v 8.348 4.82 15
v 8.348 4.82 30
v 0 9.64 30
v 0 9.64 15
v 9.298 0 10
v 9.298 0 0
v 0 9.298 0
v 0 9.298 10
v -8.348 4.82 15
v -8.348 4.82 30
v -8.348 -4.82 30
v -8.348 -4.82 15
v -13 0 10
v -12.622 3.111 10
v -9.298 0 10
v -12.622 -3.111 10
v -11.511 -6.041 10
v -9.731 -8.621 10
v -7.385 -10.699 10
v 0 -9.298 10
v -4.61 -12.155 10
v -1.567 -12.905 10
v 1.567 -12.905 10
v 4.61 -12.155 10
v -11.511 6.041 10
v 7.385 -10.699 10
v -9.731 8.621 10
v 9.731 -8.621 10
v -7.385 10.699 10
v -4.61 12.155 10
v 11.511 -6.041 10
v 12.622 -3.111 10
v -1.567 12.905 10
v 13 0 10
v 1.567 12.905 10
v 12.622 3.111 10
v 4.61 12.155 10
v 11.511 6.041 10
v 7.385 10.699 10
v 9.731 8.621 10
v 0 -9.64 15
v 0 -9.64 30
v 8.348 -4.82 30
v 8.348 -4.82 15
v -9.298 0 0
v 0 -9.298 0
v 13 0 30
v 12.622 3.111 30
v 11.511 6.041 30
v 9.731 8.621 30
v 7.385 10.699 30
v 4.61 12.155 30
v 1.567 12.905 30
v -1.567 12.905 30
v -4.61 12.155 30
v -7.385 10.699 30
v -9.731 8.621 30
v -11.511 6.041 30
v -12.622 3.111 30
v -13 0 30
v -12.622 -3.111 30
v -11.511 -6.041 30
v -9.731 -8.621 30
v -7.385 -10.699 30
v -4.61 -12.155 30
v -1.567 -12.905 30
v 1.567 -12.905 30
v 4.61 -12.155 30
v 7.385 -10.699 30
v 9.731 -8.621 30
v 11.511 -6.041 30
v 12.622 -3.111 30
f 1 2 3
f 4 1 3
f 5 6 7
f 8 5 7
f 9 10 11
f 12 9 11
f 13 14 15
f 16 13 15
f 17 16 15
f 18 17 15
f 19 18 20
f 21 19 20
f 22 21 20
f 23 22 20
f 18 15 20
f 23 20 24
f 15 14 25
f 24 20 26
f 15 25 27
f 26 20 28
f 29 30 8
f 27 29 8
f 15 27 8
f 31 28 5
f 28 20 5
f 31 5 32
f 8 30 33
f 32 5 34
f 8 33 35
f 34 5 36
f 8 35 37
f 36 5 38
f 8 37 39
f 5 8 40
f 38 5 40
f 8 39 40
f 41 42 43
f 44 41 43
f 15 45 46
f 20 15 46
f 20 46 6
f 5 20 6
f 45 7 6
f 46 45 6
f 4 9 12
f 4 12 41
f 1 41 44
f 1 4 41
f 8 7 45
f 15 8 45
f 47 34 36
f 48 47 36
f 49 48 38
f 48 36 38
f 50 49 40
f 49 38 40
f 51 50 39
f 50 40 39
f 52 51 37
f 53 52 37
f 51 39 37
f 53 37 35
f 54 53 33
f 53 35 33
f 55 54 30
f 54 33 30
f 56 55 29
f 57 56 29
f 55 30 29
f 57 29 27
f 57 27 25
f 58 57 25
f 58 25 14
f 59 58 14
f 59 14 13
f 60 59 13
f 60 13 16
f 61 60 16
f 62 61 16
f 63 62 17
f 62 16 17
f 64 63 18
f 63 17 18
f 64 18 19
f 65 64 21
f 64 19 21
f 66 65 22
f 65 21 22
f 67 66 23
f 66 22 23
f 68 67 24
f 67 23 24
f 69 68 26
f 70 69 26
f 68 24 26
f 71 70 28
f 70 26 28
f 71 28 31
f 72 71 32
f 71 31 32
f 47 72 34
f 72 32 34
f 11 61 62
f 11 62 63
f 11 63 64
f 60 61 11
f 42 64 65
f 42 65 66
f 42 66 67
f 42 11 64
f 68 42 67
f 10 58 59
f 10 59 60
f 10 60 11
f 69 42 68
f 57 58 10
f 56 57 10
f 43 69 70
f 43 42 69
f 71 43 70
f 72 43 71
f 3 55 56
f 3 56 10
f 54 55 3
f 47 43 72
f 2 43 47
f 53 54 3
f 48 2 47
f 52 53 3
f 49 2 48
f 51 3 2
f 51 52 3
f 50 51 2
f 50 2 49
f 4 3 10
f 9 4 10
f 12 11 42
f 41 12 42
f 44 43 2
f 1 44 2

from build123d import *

# Parameters (mm, degrees)
PAD_DEPTH    = 10
SKETCH001_R  = 13
PAD001_DEPTH = 20
POCKET_DEPTH = 15


with BuildPart() as part:
    # Sketch → Pad (new body)
    with BuildSketch(Plane.XY):
        Polygon((0, 9.298454), (-9.298454, 0), (0, -9.298454), (9.298454, 0), align=None)
    extrude(amount=PAD_DEPTH)

    # Sketch001 (on Face6 of Pad) → Pad001 (join)
    with BuildSketch(Plane.XY.offset(10)):
        Circle(SKETCH001_R)
    extrude(amount=PAD001_DEPTH)

    # Sketch002 (on Face3 of Pad001) → Pocket (cut)
    with BuildSketch(Plane.XY.offset(30)):
        Polygon((0, 9.64), (-8.348485, 4.82), (-8.348485, -4.82), (0, -9.64), (8.348485, -4.82), (8.348485, 4.82), align=None)
    extrude(amount=-POCKET_DEPTH, mode=Mode.SUBTRACT)


solid = part.part
